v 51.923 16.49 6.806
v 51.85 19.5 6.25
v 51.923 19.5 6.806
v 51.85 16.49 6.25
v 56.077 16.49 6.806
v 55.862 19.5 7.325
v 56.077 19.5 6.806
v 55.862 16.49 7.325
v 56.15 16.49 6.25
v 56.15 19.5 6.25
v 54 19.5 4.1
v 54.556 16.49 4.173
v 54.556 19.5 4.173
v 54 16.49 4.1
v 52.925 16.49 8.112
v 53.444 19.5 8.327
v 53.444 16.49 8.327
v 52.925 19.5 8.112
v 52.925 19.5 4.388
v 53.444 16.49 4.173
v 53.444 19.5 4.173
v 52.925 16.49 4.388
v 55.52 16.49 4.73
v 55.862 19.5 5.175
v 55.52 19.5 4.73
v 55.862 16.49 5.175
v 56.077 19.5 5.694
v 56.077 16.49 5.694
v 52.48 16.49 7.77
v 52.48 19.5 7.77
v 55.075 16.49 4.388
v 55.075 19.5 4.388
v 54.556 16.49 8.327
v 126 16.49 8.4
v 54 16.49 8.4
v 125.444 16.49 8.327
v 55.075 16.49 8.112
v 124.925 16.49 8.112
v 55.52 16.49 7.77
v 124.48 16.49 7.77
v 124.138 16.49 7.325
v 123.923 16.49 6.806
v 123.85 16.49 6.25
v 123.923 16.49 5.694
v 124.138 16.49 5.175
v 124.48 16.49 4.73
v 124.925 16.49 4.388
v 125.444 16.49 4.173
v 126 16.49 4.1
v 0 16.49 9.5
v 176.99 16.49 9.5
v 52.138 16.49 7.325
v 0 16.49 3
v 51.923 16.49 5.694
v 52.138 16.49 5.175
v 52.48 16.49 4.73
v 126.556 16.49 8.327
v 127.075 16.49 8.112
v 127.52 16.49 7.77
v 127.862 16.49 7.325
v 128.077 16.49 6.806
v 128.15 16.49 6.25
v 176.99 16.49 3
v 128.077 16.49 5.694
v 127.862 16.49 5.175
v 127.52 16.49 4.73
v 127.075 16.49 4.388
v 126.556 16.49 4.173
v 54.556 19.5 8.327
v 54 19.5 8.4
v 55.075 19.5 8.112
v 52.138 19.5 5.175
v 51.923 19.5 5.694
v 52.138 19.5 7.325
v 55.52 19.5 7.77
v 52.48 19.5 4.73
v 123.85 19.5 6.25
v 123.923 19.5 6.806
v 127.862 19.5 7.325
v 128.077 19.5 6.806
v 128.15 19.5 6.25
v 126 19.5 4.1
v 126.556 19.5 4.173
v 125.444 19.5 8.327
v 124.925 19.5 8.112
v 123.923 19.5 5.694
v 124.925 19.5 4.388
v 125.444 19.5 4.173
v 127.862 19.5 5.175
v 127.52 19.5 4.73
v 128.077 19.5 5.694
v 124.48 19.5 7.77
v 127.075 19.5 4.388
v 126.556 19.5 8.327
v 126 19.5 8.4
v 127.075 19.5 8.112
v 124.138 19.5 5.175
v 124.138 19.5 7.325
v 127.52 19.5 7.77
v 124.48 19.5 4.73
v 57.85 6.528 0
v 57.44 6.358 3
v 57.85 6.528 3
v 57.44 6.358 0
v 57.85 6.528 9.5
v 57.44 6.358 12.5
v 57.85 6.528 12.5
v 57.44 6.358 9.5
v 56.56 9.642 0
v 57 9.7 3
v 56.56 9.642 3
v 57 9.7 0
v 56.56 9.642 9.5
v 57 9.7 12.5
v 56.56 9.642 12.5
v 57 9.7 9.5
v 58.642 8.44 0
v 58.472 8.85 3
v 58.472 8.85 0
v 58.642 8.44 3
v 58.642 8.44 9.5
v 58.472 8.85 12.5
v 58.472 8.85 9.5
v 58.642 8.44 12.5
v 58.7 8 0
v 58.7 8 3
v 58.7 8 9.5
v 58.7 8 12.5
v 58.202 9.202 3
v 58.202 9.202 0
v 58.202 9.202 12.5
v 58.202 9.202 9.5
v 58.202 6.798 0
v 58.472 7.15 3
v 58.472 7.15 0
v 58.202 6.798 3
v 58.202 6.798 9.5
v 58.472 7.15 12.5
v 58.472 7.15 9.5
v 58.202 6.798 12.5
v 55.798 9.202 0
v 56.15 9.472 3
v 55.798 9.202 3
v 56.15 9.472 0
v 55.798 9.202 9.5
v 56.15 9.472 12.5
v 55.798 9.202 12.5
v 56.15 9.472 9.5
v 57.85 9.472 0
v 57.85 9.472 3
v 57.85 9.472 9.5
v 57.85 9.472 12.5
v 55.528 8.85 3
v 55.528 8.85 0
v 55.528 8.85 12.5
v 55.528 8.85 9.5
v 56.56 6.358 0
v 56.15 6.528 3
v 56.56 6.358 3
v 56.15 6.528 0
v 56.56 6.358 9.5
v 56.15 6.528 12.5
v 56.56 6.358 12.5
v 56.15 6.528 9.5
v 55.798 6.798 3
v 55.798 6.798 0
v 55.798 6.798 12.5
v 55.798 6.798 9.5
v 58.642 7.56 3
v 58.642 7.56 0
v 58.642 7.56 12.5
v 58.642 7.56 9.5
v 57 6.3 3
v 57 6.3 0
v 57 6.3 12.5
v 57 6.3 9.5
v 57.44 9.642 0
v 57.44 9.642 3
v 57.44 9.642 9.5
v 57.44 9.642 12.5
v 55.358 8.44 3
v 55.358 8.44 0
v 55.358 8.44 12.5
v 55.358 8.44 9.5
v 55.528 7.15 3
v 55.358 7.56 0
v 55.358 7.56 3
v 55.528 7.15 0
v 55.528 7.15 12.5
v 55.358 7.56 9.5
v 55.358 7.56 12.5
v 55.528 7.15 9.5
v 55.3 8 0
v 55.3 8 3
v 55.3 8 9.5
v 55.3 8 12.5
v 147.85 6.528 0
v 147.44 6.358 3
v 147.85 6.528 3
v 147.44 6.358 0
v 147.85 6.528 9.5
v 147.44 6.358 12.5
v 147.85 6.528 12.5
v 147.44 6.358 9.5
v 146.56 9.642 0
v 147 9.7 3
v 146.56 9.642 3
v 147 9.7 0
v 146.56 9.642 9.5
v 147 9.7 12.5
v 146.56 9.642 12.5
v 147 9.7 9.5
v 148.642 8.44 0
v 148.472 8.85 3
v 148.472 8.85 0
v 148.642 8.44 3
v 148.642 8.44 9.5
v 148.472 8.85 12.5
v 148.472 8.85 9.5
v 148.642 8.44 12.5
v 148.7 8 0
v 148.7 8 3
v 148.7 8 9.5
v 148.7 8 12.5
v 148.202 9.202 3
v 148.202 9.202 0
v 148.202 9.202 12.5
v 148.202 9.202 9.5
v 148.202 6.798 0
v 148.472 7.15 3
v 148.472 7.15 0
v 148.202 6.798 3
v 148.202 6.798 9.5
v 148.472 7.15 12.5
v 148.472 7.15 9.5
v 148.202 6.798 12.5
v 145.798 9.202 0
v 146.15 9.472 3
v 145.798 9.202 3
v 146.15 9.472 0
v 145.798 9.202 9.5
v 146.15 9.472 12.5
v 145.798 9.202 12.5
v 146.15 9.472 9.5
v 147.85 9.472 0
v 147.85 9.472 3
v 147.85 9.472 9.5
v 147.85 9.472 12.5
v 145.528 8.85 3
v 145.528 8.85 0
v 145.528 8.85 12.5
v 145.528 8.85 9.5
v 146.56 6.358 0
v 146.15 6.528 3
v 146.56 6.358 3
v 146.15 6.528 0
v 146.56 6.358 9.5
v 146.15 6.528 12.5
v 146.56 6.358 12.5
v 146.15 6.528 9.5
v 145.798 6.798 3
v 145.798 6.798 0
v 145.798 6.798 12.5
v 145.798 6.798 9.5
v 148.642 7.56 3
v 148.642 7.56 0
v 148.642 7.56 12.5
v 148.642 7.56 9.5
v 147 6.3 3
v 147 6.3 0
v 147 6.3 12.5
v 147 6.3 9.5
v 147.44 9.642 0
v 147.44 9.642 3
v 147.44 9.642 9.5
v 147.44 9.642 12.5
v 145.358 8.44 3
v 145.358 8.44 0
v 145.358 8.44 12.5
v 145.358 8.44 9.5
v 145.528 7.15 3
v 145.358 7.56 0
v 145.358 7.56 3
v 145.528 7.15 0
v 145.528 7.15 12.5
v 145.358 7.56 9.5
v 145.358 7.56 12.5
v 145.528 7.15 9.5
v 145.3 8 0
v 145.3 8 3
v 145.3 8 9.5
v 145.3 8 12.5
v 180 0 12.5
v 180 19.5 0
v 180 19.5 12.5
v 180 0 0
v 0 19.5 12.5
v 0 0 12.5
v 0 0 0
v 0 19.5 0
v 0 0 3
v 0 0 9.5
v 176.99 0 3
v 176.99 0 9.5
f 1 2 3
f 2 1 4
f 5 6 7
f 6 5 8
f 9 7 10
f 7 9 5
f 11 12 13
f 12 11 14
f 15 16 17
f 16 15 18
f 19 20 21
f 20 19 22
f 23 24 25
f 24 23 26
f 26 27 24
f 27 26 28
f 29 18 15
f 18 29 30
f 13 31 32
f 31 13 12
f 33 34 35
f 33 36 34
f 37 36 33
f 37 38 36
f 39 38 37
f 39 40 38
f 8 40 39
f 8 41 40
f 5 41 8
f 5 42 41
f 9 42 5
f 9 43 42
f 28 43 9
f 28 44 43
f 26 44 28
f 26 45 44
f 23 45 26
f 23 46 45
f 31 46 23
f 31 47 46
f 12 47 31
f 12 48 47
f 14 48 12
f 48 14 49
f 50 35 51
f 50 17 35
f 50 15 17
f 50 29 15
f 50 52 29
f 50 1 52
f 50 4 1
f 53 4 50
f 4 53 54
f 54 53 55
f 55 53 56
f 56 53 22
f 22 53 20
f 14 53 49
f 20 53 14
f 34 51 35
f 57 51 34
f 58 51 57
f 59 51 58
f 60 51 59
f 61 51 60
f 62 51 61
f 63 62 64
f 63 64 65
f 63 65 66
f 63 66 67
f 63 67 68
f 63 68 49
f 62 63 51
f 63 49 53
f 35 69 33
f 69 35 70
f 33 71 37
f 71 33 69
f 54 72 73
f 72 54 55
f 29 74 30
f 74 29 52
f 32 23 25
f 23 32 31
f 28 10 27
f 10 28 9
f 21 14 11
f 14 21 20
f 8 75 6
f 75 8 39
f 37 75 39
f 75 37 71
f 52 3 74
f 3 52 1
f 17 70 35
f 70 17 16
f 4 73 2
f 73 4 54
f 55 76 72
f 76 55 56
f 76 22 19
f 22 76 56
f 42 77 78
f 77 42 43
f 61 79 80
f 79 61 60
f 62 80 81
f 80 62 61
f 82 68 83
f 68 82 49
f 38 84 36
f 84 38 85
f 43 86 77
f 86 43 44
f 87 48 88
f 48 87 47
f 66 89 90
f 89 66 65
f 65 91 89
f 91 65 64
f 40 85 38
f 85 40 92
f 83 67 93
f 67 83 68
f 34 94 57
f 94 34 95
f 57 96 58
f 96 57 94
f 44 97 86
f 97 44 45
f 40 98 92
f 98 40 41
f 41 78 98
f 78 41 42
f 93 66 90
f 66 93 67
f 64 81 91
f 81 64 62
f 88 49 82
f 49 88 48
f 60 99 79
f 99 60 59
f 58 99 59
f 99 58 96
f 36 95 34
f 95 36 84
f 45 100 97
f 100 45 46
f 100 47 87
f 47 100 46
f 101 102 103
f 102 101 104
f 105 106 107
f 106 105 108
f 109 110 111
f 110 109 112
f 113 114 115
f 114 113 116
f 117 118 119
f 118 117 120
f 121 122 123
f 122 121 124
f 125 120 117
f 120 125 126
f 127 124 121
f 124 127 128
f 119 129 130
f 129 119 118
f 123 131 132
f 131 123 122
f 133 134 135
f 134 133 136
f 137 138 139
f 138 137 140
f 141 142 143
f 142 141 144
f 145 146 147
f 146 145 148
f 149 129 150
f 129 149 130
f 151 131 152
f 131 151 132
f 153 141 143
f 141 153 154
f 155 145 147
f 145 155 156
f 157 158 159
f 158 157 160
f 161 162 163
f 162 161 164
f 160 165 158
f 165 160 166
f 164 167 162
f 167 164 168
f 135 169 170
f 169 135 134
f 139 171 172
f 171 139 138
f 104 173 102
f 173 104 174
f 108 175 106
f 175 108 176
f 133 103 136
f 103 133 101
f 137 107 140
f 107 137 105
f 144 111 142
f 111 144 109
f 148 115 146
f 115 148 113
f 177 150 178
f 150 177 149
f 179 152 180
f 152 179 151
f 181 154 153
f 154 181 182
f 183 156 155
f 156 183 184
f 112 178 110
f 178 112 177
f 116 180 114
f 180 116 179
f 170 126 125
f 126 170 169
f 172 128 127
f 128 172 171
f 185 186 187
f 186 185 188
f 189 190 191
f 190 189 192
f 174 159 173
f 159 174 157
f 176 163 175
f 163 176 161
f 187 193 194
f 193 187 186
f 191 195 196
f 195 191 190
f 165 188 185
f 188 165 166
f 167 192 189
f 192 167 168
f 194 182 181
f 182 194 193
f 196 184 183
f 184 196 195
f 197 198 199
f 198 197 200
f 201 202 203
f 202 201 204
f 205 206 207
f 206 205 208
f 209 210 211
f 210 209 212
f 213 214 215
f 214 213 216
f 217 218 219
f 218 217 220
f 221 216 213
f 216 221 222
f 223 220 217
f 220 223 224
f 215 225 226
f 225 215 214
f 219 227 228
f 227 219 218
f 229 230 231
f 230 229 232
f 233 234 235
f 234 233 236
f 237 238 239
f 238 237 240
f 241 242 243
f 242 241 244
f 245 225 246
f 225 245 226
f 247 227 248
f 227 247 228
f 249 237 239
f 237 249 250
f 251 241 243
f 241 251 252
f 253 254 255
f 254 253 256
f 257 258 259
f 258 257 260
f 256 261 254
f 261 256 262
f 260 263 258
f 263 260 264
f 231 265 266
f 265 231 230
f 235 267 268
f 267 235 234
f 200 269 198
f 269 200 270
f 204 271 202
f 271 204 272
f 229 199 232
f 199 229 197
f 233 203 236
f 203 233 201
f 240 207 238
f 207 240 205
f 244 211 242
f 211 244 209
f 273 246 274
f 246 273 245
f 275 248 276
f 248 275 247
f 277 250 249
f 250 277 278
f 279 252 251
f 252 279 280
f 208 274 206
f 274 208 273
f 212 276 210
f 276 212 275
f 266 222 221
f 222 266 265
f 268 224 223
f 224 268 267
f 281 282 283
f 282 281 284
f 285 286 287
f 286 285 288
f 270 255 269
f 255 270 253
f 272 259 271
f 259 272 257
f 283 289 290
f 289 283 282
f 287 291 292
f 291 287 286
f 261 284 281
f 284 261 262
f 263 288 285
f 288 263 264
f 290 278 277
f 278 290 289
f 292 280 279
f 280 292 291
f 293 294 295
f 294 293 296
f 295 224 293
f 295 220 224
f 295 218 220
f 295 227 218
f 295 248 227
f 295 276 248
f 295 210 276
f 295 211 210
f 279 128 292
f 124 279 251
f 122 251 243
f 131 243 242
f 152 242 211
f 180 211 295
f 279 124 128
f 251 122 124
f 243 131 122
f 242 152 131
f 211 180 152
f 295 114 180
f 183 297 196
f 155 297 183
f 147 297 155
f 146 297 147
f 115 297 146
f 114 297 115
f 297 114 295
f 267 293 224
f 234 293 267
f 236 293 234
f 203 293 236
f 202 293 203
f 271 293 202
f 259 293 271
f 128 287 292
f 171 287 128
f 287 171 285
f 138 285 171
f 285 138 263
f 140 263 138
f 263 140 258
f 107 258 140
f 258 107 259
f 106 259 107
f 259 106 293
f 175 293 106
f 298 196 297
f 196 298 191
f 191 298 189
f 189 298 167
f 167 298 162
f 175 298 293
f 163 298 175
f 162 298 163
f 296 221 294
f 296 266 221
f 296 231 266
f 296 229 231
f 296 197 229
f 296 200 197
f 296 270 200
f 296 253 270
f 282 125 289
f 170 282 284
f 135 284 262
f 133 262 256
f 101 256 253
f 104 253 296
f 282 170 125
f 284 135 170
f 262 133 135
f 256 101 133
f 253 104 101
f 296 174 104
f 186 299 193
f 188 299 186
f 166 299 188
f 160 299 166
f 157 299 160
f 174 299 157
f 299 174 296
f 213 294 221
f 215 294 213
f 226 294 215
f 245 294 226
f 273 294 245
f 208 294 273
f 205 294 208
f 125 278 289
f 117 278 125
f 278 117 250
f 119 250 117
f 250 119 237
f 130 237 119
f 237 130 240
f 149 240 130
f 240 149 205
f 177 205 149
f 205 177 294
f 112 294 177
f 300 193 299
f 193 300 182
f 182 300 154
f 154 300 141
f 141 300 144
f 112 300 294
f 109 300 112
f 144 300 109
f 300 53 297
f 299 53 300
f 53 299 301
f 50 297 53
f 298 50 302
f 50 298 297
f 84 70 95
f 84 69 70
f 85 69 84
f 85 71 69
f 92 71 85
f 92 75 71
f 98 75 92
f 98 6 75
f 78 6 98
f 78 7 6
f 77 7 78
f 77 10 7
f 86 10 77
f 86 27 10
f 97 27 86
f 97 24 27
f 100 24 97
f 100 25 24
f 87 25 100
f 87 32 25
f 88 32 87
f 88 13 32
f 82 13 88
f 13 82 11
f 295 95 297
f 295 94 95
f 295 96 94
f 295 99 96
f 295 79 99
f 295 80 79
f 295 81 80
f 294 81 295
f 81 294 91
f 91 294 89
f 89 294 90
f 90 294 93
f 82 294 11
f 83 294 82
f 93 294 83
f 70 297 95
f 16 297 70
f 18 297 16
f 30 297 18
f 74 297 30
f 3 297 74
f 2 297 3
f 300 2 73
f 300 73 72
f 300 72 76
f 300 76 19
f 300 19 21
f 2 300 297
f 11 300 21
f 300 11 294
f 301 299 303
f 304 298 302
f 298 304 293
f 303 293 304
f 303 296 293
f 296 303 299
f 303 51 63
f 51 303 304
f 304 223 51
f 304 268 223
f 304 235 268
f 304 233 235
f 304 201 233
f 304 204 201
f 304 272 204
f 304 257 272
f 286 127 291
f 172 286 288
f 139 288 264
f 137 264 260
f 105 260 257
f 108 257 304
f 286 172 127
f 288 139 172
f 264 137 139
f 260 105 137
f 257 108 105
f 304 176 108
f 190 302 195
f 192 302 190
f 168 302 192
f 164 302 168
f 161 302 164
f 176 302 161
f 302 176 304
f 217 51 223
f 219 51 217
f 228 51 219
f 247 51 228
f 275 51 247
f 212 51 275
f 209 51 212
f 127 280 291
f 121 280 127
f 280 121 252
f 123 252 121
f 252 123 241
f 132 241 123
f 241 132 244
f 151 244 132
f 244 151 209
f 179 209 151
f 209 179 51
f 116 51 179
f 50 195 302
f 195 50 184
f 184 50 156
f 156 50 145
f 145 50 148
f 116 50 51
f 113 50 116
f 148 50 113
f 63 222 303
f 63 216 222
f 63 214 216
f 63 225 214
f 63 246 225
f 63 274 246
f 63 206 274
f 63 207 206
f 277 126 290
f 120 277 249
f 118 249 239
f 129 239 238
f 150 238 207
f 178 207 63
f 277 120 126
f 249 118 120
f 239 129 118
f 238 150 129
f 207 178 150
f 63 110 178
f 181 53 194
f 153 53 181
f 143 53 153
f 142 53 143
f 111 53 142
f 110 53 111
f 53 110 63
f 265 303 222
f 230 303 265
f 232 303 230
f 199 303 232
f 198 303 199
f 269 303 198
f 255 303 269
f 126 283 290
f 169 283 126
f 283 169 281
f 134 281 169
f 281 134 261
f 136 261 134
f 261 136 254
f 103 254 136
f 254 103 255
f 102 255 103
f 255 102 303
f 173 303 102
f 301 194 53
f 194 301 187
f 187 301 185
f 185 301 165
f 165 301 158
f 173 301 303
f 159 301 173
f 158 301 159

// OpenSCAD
// =====================================================================
// FUZE / Helios — Down Sandwich Test Frame  (V3 clamshell, 2026-06-04)
// Two separate halves, NO printed hinge. Lift the lid right off to lay an
// even layer of free-form down in the tray; set the lid back (a perimeter
// spigot self-aligns it) and clamp with 4 corner screws. Mesh on BOTH outer
// faces. Hangs vertically: a top rail slides into a side-loading C-channel.
//
//   PART = "tray"    -> deep half (10 mm down cavity)        [print 1]
//   PART = "lid"     -> mesh lid half                        [print 1]
//   PART = "channel" -> side-loading C-channel (load cell)   [print 1]
//   PART = "both"    -> tray + lid + channel preview
//
// Material: PC (PETG later). Print each half FLAT, mesh-face DOWN.
// MESH: pause-embed at layer 8 = Z 1.5 mm @ 0.2 mm layers (both halves).
// =====================================================================

PART = "channel";
$fn = 48;

SIZE     = 250;     // outer square (mm)
WALL     = 4;       // frame wall thickness
CAV      = 10;      // down cavity depth (tray)
FLOOR_H  = 3.0;     // mesh-support rib plane (1.5 backing + 1.5 cap, mesh @ layer 8)
RIB_W    = 2.0;     // rib width
CELLS    = 4;       // NxN support-rib cells
CLR      = 0.4;     // fit clearance

TRAY_T = FLOOR_H + CAV;   // tray wall height (13)
LID_RIM = 5.0;            // lid wall height
LID_T   = FLOOR_H + LID_RIM;

// registration spigot (drops into the tray cavity mouth to self-align the lid)
SPIG_T   = 2.0;     // spigot wall thickness
SPIG_H   = 4.0;     // how far it drops into the tray

// corner closure screws (M3)
SCREW_CLR = 3.4;    // clearance hole (lid)
INSERT_D  = 4.2;    // M3 heat-set insert bore (tray)
INSERT_H  = 6.0;
BOSS_D    = 9;
INSET     = BOSS_D/2 + 2;   // boss center inset from the corner

// top hang tab (flat, in the plane of the frame, sticks OUT past the top edge so
// it never conflicts with the lid) + side-loading C-channel that grips the tab.
RAIL_LEN = 150;   // tab width along the top edge (X)
RAIL_OUT = 16;    // how far the tab sticks out past the top edge (Y)
RAIL_T   = 6;     // tab thickness (Z) — what the channel grips
CH_CLR = 0.5; CH_WALL = 3; CH_LEN = RAIL_LEN + 30;
// locking pins: 2 holes through channel-lip + tab + channel-lip; drop M3 screws/pins
LOCK_D    = 3.4;          // M3 clearance / 3 mm pin
LOCK_SP   = 90;           // spacing between the 2 lock holes
LOCK_Y    = RAIL_OUT/2;   // depth into the tab where the holes sit

WIN = SIZE - 2*WALL;
EPS = 0.01;

// ---------------------------------------------------------------
module sq(s,h){ cube([s,s,h]); }

module rib_grid(h){
    step = WIN/CELLS;
    intersection(){
        union(){
            for(i=[0:CELLS]) translate([i*step-RIB_W/2,0,0]) cube([RIB_W,WIN,h]);
            for(j=[0:CELLS]) translate([0,j*step-RIB_W/2,0]) cube([WIN,RIB_W,h]);
        }
        cube([WIN,WIN,h]);
    }
}
module ring(h){ difference(){ sq(SIZE,h); translate([WALL,WALL,-EPS]) sq(WIN,h+2*EPS);} }

// 4 corner positions
function corners() = [[INSET,INSET],[SIZE-INSET,INSET],[INSET,SIZE-INSET],[SIZE-INSET,SIZE-INSET]];

module tray_bosses(){          // bosses with heat-set insert bores
    for(c=corners()) translate([c[0],c[1],0])
        difference(){ cylinder(d=BOSS_D,h=TRAY_T); translate([0,0,TRAY_T-INSERT_H]) cylinder(d=INSERT_D,h=INSERT_H+EPS,$fn=24); }
}
module lid_bosses(){           // bosses with screw clearance + counterbore
    for(c=corners()) translate([c[0],c[1],0])
        difference(){ cylinder(d=BOSS_D,h=LID_T); translate([0,0,-EPS]) cylinder(d=SCREW_CLR,h=LID_T+2*EPS,$fn=24);
                      translate([0,0,LID_T-2.5]) cylinder(d=6,h=3,$fn=24); }
}
// registration spigot ring on the lid (fits inside the tray cavity mouth)
module spigot(){
    o = WALL + CLR;                       // sits just inside the tray inner wall
    translate([o,o,LID_T-EPS])
        difference(){
            sq(SIZE-2*o, SPIG_H+EPS);
            translate([SPIG_T,SPIG_T,-EPS]) sq(SIZE-2*o-2*SPIG_T, SPIG_H+3*EPS);
        }
}

// Flat hang tab: a plate sticking OUT past the top edge (+Y), thickness in Z.
// Sits at the top of the tray wall so the lid (which stacks in +Z) clears it.
module hang_tab(){
    difference(){
        translate([(SIZE-RAIL_LEN)/2, SIZE-EPS, TRAY_T-RAIL_T])
            cube([RAIL_LEN, RAIL_OUT+EPS, RAIL_T]);
        for(sx=[SIZE/2-LOCK_SP/2, SIZE/2+LOCK_SP/2])
            translate([sx, SIZE+LOCK_Y, TRAY_T-RAIL_T-EPS]) cylinder(d=LOCK_D, h=RAIL_T+2*EPS, $fn=24);
    }
}
// C-channel grips the tab top+bottom (Z) and the back (Y); the tab slides in from
// one X end to an end-stop; the front (toward the frame) is open so the neck passes.
module c_channel(){
    slotY = RAIL_OUT + CH_CLR;            // tab depth into the channel (Y)
    slotZ = RAIL_T + CH_CLR;              // tab thickness (Z)
    outerY = slotY + CH_WALL;             // back wall
    outerZ = slotZ + 2*CH_WALL;           // top + bottom lips
    difference(){
        cube([CH_LEN, outerY, outerZ]);
        // pocket: open at X=0 (insert) and at Y=0 (front, frame neck passes); far X end = stop
        translate([-EPS, -EPS, CH_WALL]) cube([CH_LEN-CH_WALL, slotY, slotZ]);
        // mount holes on the back flange to bolt onto the inverted load cell
        for(x=[CH_LEN*0.3,CH_LEN*0.7]) translate([x, outerY+EPS, outerZ/2]) rotate([90,0,0]) cylinder(d=4.3,h=CH_WALL+2*EPS,$fn=24);
        // LOCK holes: vertical, through top lip + tab + bottom lip, aligned when the
        // tab is fully seated against the end-stop. Drop in 2 M3 screws/pins to lock.
        for(sx=[(CH_LEN-CH_WALL)-RAIL_LEN/2 - LOCK_SP/2, (CH_LEN-CH_WALL)-RAIL_LEN/2 + LOCK_SP/2])
            translate([sx, LOCK_Y, -EPS]) cylinder(d=LOCK_D, h=outerZ+2*EPS, $fn=24);
    }
}

// ---------------- HALVES ----------------
module tray_half(){
    union(){
        translate([WALL,WALL,0]) rib_grid(FLOOR_H);
        ring(TRAY_T);
        tray_bosses();
        hang_tab();
    }
}
module lid_half(){
    union(){
        translate([WALL,WALL,0]) rib_grid(FLOOR_H);
        ring(LID_T);
        lid_bosses();
        spigot();
    }
}

// ---------------- selector ----------------
if      (PART=="tray")    tray_half();
else if (PART=="lid")     lid_half();
else if (PART=="channel") c_channel();
else { tray_half(); translate([SIZE+30,0,0]) lid_half(); translate([0,-70,0]) c_channel(); }

// =====================================================================
// ASSEMBLY
// 1. Print tray + lid (mesh-face DOWN, pause layer 8 for mesh) + 1 C-channel, PC.
// 2. Stretch/embed bridal mesh on each rib grid.
// 3. Press 4x M3 heat-set inserts into the tray corner bosses.
// 4. Lay a standardized small even down layer in the tray. Set the lid on — the
//    perimeter spigot drops into the cavity mouth and self-aligns it. Drive 4x M3.
// 5. Bolt the C-channel to the inverted load cell; slide the tray's top rail in
//    from the open end to the end-stop; tare; run protocol.
// To reload: back out the 4 screws, lift the lid straight off.
// =====================================================================
